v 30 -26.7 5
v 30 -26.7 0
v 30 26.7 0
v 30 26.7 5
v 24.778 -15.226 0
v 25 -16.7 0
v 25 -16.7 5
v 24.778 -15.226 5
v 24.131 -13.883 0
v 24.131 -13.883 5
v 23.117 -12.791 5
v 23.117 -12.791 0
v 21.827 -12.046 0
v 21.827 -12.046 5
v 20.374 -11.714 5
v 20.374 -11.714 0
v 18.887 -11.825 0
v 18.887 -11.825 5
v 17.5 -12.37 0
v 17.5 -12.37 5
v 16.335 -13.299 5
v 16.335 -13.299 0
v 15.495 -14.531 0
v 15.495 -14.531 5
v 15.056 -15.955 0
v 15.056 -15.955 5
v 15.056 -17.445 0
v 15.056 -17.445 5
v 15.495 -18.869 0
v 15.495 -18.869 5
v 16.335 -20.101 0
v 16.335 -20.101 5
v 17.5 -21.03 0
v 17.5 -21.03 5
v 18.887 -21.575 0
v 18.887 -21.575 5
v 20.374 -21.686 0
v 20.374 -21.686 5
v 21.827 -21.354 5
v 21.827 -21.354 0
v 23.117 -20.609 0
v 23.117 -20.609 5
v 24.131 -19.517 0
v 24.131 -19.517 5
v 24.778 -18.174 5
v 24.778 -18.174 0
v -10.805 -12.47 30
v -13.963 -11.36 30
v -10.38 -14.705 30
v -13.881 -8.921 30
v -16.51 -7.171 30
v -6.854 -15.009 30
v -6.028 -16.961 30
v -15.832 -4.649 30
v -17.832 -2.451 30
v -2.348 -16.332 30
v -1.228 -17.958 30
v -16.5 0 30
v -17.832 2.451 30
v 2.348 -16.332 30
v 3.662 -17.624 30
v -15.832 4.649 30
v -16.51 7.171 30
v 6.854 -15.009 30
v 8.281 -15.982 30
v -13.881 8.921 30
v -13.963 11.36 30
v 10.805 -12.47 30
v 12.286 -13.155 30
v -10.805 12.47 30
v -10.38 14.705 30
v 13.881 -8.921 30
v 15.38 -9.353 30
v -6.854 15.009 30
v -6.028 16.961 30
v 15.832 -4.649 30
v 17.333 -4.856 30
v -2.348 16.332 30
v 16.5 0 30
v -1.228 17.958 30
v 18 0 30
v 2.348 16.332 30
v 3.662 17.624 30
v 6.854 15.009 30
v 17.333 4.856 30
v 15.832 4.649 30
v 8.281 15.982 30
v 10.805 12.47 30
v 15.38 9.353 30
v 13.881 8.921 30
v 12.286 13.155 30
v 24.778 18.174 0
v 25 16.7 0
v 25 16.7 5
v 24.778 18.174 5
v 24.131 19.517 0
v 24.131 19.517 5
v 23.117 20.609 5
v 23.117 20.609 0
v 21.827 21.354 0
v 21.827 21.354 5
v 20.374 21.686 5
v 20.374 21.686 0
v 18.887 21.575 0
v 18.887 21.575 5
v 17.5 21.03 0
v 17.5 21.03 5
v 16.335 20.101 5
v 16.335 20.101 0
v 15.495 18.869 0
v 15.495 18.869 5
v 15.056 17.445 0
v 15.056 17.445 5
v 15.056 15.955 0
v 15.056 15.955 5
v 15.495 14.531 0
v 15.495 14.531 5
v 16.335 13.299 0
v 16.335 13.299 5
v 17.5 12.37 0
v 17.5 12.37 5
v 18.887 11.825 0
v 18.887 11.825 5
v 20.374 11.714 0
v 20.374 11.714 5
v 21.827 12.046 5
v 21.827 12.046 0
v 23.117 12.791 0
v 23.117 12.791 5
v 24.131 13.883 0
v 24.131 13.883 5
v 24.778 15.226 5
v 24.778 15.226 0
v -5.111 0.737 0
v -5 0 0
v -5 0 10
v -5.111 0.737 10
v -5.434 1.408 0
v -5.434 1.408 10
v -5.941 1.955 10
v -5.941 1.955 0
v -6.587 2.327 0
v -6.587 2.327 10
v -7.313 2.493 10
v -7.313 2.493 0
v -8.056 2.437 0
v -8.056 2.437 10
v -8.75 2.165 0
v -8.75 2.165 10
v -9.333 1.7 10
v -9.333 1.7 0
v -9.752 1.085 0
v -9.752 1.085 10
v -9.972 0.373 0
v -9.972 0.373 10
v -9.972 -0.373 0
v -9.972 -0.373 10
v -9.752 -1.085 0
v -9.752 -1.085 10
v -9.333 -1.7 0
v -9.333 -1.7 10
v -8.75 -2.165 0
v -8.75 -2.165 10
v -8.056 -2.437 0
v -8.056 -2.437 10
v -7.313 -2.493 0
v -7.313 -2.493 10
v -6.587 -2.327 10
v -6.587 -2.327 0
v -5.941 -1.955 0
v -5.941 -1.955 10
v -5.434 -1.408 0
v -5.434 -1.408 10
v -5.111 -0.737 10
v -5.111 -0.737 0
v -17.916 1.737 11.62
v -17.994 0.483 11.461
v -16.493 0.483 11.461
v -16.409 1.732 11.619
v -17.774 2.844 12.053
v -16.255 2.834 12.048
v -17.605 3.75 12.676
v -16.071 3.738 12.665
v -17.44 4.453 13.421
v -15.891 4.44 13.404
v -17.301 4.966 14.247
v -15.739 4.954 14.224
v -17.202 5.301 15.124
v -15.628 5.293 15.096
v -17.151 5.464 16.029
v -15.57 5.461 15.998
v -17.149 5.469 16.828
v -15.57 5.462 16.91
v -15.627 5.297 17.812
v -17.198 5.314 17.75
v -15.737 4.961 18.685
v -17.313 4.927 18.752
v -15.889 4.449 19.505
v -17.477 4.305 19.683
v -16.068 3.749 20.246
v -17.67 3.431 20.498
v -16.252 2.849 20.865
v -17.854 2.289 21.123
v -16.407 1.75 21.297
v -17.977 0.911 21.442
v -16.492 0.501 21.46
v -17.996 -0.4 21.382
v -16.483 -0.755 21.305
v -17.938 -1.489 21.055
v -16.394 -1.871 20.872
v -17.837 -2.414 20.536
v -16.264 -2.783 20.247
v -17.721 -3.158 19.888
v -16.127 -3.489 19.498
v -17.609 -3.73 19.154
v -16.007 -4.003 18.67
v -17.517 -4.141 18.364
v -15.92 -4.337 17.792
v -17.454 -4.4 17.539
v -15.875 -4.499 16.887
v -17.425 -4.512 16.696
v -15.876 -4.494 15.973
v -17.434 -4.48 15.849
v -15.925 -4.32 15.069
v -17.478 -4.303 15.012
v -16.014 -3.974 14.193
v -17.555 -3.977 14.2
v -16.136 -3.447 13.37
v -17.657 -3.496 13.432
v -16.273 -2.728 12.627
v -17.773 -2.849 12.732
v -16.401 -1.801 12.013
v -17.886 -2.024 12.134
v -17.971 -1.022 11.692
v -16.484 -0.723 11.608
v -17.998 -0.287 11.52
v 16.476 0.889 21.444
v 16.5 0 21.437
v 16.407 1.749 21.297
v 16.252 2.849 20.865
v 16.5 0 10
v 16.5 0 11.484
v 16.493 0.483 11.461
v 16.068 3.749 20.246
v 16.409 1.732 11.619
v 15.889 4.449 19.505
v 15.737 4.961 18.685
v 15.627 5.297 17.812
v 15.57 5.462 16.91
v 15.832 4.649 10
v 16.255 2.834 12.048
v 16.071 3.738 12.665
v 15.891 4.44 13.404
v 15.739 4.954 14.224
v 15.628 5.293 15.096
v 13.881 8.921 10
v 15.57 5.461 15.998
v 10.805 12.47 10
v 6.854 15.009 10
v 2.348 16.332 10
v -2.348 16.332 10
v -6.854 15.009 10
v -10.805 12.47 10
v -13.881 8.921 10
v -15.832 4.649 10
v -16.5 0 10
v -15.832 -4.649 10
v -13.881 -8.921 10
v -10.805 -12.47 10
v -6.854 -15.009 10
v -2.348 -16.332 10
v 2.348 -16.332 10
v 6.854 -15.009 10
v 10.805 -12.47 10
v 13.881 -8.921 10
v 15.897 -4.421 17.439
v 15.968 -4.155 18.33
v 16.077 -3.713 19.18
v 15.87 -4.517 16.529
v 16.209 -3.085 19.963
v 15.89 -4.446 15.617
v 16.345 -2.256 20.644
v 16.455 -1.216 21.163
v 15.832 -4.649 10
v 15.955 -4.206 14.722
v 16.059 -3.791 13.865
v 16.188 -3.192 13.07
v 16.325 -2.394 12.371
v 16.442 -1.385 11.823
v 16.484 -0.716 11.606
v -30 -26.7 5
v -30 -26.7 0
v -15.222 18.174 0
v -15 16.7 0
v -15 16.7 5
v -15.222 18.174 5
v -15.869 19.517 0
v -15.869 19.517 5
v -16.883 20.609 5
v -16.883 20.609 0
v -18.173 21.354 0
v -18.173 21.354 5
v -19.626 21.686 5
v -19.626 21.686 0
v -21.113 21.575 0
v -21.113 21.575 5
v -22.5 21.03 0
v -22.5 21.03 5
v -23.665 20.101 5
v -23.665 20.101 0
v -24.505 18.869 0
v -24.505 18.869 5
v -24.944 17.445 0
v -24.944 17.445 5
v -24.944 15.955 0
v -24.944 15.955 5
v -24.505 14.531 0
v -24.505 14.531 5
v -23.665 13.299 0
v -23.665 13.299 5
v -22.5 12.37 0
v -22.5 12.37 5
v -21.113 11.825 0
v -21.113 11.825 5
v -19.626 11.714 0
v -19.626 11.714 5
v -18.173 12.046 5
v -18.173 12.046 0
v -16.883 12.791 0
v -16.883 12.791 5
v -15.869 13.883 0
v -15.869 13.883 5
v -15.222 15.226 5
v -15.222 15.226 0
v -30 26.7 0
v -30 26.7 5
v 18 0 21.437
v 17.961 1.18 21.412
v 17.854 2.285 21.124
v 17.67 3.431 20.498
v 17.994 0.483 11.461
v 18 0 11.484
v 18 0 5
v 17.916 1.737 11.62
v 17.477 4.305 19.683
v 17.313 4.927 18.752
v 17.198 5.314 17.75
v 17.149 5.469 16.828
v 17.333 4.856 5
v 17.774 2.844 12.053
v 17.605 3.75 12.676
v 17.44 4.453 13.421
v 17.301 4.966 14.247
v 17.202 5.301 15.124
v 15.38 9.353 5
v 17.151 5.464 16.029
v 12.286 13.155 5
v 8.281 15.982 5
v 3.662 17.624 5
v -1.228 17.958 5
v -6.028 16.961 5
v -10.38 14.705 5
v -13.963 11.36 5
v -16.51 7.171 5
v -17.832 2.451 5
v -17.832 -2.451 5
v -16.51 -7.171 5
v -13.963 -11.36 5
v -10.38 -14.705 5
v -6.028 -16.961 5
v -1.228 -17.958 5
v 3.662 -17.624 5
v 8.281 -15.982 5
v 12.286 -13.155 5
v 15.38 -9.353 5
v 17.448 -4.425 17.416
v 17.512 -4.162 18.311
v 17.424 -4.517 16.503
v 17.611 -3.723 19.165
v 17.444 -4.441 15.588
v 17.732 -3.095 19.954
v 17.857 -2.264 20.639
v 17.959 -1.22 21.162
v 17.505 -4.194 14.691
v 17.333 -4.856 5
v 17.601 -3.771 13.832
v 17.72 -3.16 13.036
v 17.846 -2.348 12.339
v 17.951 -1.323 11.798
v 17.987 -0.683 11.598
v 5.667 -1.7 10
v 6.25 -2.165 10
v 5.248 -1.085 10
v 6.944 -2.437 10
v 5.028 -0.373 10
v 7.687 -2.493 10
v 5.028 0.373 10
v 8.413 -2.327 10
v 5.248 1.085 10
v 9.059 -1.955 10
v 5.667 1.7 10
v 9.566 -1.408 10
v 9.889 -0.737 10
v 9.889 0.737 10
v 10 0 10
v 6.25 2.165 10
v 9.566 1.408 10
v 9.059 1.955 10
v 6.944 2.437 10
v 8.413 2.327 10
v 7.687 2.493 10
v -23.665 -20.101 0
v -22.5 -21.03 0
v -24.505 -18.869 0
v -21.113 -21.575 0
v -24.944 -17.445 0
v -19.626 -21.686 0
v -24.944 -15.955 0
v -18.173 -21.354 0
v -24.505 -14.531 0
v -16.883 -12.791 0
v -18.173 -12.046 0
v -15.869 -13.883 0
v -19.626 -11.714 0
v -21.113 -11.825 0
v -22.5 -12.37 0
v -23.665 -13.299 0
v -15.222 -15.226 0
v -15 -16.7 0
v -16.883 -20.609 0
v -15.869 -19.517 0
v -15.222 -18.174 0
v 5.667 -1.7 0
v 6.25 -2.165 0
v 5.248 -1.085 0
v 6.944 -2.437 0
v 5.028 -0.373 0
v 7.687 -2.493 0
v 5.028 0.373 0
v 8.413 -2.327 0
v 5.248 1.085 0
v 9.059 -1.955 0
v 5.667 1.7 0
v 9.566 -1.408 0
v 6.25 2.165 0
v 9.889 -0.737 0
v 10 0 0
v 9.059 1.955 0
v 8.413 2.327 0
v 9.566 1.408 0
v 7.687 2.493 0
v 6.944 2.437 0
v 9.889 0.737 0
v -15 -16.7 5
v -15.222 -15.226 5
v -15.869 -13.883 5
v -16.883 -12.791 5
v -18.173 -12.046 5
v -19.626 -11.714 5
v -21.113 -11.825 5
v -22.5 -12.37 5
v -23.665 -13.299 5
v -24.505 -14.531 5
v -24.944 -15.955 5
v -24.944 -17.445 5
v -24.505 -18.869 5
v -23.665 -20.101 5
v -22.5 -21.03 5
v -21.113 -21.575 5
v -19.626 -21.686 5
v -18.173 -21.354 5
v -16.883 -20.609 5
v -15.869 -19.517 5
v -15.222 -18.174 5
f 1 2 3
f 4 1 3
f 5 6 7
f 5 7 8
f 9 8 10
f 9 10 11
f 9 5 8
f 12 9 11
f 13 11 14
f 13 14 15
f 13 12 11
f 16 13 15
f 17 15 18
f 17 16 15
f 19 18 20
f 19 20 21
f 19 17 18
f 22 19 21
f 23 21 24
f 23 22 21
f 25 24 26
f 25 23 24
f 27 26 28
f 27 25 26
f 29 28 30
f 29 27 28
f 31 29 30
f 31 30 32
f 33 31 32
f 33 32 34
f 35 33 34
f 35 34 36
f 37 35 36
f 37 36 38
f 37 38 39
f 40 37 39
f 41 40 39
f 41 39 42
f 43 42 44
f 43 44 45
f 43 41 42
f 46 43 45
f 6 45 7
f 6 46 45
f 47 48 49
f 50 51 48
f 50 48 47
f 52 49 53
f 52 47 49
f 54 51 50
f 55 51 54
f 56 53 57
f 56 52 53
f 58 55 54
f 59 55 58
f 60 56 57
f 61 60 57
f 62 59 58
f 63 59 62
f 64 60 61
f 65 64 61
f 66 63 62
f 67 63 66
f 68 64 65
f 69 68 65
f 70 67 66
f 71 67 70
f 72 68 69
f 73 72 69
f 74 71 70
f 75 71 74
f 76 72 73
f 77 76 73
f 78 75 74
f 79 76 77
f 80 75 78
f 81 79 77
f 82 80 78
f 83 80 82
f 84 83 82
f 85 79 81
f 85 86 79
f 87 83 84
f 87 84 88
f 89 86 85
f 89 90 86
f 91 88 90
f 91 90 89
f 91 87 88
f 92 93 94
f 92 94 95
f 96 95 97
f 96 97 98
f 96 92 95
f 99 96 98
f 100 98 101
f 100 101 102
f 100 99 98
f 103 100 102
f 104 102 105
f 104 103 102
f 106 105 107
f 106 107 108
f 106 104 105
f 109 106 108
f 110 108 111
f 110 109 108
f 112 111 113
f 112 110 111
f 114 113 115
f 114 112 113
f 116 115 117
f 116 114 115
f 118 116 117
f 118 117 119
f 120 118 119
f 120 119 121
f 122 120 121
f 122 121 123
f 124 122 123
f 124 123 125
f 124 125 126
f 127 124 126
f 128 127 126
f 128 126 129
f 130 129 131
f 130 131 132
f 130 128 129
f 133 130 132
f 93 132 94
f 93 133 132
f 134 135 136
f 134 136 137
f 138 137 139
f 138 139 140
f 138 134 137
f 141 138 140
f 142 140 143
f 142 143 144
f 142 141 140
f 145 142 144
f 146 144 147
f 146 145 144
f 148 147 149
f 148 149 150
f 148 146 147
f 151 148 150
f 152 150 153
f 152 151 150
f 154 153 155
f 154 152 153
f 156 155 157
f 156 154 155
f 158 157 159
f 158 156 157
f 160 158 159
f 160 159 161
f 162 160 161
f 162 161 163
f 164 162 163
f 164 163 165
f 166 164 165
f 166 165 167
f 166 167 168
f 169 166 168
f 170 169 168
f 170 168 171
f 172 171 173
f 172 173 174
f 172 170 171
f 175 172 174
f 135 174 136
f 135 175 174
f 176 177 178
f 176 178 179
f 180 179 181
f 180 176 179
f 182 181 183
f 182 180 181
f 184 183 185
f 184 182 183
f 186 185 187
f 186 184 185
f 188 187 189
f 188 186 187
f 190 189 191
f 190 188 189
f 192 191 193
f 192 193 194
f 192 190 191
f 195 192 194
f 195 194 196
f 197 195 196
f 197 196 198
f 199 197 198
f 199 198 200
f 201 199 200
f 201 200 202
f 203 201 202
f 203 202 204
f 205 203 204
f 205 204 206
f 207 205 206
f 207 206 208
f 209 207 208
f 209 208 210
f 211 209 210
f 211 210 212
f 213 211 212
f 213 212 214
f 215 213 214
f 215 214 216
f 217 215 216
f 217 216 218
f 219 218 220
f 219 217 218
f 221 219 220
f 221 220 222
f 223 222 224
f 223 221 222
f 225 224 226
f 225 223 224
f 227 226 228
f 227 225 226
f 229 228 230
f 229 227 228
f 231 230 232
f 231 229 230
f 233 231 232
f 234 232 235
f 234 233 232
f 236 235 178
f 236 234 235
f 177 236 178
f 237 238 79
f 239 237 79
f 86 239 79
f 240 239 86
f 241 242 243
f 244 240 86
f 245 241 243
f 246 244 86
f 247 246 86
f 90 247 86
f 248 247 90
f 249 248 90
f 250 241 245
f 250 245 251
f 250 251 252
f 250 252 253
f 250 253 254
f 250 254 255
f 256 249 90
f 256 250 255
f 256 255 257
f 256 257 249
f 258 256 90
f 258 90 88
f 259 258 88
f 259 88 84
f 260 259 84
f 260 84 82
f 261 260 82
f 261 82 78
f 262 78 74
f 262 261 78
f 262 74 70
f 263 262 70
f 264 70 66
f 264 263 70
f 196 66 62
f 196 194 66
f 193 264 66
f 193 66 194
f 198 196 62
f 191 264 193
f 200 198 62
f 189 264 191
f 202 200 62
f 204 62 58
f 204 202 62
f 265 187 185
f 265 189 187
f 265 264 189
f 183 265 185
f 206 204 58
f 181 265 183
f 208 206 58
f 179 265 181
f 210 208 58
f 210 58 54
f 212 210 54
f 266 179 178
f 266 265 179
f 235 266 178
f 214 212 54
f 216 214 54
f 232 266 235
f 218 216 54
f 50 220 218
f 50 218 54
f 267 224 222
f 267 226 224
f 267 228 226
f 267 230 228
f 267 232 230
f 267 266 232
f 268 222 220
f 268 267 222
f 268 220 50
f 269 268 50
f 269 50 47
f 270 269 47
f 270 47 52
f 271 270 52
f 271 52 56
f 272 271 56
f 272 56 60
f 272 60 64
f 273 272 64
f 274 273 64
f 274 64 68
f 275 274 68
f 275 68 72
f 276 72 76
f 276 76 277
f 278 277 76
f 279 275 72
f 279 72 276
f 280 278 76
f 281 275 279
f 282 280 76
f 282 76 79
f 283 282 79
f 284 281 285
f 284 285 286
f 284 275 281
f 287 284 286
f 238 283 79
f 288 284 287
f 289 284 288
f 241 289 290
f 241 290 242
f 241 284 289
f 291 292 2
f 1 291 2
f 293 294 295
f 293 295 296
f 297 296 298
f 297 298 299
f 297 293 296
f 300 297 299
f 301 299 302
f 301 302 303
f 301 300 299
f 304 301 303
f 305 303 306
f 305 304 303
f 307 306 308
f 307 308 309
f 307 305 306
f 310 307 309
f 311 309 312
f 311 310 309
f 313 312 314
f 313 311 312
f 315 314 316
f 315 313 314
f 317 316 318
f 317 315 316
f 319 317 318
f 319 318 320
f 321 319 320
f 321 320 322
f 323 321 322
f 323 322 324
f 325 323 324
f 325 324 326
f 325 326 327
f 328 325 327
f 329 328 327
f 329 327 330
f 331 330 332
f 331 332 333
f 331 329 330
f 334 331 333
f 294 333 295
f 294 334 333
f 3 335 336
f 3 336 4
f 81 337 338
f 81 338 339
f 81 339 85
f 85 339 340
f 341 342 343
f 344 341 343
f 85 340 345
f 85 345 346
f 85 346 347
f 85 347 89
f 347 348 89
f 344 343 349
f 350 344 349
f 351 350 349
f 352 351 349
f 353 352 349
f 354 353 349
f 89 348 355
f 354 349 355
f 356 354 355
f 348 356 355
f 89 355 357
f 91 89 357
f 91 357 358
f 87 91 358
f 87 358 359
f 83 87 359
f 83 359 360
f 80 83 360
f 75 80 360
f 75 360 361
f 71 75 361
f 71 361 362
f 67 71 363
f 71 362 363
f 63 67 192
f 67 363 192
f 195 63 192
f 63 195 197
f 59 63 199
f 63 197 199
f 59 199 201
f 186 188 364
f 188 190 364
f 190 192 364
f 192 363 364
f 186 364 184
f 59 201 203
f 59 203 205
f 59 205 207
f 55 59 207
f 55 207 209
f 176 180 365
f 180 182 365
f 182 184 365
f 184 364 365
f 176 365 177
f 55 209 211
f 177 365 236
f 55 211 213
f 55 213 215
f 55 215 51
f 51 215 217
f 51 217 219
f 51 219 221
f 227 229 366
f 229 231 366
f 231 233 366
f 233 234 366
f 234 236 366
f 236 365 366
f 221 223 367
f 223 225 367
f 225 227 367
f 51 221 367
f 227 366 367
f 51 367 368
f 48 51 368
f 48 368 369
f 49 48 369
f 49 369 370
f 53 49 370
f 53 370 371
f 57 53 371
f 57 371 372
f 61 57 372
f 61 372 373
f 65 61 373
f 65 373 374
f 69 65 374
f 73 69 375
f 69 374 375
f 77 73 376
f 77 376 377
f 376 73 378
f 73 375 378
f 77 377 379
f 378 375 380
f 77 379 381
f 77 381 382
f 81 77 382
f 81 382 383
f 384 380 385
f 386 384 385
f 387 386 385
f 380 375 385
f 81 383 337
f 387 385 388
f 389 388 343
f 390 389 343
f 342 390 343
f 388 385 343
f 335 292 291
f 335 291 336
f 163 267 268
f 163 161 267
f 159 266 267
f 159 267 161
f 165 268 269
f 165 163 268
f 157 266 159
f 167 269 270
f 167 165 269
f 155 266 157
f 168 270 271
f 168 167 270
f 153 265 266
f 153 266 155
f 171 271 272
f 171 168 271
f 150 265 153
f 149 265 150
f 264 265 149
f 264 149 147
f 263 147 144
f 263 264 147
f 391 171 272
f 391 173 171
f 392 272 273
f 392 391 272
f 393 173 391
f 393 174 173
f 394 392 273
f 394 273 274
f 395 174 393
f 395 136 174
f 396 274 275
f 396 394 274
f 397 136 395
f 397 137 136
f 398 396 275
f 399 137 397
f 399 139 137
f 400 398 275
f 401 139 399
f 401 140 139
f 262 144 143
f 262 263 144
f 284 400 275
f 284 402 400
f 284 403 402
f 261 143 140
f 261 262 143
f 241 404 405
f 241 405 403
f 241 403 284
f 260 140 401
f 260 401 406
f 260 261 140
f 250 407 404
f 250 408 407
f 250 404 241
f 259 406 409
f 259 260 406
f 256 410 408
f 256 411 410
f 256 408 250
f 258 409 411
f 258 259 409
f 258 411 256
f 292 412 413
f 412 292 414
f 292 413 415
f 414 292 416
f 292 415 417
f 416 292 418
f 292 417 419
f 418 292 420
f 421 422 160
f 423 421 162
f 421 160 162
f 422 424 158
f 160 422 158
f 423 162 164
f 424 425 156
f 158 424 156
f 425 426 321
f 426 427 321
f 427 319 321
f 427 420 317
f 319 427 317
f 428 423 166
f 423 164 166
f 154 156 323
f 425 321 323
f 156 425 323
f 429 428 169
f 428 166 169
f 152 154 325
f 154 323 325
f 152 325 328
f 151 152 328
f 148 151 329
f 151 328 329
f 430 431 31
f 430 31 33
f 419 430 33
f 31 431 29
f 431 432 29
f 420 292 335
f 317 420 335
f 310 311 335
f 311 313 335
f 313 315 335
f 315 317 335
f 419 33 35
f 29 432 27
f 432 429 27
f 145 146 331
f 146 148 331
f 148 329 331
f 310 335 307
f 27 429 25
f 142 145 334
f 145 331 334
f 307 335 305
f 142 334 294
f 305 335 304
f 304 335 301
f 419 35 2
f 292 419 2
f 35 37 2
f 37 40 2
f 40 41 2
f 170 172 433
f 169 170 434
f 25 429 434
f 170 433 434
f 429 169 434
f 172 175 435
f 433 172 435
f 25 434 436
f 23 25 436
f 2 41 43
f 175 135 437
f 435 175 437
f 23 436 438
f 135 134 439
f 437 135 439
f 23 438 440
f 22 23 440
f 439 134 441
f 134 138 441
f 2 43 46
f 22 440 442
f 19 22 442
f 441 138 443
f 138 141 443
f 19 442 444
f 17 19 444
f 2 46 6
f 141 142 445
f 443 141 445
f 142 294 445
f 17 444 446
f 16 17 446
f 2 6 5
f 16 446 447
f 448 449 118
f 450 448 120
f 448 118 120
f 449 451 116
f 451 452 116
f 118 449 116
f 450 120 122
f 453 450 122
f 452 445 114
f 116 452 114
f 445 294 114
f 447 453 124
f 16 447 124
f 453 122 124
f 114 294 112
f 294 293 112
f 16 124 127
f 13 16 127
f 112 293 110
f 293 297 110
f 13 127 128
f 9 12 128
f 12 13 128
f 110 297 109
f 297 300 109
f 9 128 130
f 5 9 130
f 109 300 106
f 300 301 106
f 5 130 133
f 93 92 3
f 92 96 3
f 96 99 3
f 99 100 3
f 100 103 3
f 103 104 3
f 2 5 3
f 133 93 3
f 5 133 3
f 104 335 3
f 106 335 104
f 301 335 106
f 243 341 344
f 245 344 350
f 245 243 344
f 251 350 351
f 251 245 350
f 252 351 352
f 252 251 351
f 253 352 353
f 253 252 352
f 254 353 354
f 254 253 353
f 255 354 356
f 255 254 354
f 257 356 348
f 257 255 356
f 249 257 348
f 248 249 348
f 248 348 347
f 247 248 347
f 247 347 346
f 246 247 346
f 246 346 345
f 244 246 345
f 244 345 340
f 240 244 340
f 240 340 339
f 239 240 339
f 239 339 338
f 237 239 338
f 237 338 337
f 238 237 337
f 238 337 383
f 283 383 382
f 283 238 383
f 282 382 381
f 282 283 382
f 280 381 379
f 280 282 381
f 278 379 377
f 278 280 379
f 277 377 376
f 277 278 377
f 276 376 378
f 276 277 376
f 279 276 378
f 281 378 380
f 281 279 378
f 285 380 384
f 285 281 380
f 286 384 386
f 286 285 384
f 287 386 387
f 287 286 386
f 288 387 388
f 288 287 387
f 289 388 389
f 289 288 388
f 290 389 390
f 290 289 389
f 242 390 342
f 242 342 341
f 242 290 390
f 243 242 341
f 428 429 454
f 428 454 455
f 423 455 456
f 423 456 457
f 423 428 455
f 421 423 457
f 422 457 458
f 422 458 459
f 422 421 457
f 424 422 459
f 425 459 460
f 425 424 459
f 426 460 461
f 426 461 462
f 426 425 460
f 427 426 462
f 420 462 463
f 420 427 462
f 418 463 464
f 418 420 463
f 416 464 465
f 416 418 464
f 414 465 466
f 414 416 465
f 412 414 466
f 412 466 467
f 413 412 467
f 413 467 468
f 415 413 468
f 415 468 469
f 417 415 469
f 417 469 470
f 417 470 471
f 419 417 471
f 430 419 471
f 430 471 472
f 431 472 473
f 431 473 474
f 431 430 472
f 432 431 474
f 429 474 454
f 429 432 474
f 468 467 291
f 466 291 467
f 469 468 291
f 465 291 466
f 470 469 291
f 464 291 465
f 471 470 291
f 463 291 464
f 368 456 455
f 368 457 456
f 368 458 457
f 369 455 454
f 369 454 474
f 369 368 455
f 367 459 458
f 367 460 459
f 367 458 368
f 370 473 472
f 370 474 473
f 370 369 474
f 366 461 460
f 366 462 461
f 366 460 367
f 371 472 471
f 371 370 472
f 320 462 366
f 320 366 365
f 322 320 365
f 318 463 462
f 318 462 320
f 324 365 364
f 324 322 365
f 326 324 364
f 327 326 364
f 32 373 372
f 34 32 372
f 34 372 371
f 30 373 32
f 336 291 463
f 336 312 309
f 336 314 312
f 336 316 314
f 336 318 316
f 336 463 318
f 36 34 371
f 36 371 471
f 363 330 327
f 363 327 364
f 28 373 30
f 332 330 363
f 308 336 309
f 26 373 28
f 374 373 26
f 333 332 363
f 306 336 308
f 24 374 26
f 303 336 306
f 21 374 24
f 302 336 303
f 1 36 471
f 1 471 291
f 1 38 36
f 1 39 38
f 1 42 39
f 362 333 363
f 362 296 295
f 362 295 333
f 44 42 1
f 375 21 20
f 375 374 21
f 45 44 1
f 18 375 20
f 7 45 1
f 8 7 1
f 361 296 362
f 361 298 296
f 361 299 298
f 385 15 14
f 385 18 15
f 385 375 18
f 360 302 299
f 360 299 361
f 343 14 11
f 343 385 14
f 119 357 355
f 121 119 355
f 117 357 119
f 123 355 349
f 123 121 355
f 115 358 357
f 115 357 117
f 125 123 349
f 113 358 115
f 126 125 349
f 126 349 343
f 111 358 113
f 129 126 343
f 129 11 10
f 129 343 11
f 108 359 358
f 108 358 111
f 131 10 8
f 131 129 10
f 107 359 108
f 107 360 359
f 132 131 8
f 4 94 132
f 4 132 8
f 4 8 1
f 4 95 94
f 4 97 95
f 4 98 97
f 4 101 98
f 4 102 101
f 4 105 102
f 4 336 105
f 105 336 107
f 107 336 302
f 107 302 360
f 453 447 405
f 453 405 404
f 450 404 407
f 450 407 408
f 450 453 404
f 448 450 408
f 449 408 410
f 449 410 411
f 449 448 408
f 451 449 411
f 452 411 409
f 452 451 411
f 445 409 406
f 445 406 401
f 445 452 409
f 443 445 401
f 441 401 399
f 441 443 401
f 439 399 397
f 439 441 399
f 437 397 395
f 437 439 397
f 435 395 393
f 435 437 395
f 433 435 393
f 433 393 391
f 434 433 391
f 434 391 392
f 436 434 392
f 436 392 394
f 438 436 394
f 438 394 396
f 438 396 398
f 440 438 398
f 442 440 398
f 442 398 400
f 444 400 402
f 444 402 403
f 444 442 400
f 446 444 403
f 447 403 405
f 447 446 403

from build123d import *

# Parameters (mm, degrees)
SKETCH1_W               = 60
SKETCH1_H               = 53.4
SKETCH1_R               = 5
SKETCH1_R_2             = 18
BOSS_EXTRUDE1_DEPTH     = 5
SKETCH1_3_R             = 18
SKETCH1_3_R_2           = 16.5
BOSS_EXTRUDE2_DEPTH     = 30
SKETCH1_4_R             = 16.5
SKETCH1_4_R_2           = 2.5
BOSS_EXTRUDE3_DEPTH     = 10
CUT_EXTRUDE1_DEPTH      = 51.128734275
CUT_EXTRUDE1_DEPTH_BACK = 51.128734275
SKETCH2_R               = 5


with BuildPart() as part:
    # Sketch1 → Boss-Extrude1 (new body)
    with BuildSketch(Plane.XY):
        Rectangle(SKETCH1_W, SKETCH1_H)
        with Locations((-20, -16.7)):
            Circle(SKETCH1_R, mode=Mode.SUBTRACT)
        with Locations((20, -16.7)):
            Circle(SKETCH1_R, mode=Mode.SUBTRACT)
        with Locations((20, 16.7)):
            Circle(SKETCH1_R, mode=Mode.SUBTRACT)
        with Locations((-20, 16.7)):
            Circle(SKETCH1_R, mode=Mode.SUBTRACT)
        Circle(SKETCH1_R_2, mode=Mode.SUBTRACT)
    extrude(amount=BOSS_EXTRUDE1_DEPTH)

    # Sketch1<3> → Boss-Extrude2 (add)
    with BuildSketch(Plane.XY):
        Circle(SKETCH1_3_R)
        Circle(SKETCH1_3_R_2, mode=Mode.SUBTRACT)
    extrude(amount=BOSS_EXTRUDE2_DEPTH)

    # Sketch1<4> → Boss-Extrude3 (add)
    with BuildSketch(Plane.XY):
        Circle(SKETCH1_4_R)
        with Locations((7.5, 0)):
            Circle(SKETCH1_4_R_2, mode=Mode.SUBTRACT)
        with Locations((-7.5, 0)):
            Circle(SKETCH1_4_R_2, mode=Mode.SUBTRACT)
    extrude(amount=BOSS_EXTRUDE3_DEPTH)

    # Sketch2 → Cut-Extrude1 (cut, two sides: drawn at the far end of the back side and taken through both)
    with BuildSketch(Plane(origin=(0, 0, 0), x_dir=(0, 0, -1), z_dir=(1, 0, 0)).offset(-CUT_EXTRUDE1_DEPTH_BACK)):
        with Locations((-16.460509222, 0.48266687)):
            Circle(SKETCH2_R)
    extrude(amount=CUT_EXTRUDE1_DEPTH + CUT_EXTRUDE1_DEPTH_BACK, mode=Mode.SUBTRACT)


solid = part.part
